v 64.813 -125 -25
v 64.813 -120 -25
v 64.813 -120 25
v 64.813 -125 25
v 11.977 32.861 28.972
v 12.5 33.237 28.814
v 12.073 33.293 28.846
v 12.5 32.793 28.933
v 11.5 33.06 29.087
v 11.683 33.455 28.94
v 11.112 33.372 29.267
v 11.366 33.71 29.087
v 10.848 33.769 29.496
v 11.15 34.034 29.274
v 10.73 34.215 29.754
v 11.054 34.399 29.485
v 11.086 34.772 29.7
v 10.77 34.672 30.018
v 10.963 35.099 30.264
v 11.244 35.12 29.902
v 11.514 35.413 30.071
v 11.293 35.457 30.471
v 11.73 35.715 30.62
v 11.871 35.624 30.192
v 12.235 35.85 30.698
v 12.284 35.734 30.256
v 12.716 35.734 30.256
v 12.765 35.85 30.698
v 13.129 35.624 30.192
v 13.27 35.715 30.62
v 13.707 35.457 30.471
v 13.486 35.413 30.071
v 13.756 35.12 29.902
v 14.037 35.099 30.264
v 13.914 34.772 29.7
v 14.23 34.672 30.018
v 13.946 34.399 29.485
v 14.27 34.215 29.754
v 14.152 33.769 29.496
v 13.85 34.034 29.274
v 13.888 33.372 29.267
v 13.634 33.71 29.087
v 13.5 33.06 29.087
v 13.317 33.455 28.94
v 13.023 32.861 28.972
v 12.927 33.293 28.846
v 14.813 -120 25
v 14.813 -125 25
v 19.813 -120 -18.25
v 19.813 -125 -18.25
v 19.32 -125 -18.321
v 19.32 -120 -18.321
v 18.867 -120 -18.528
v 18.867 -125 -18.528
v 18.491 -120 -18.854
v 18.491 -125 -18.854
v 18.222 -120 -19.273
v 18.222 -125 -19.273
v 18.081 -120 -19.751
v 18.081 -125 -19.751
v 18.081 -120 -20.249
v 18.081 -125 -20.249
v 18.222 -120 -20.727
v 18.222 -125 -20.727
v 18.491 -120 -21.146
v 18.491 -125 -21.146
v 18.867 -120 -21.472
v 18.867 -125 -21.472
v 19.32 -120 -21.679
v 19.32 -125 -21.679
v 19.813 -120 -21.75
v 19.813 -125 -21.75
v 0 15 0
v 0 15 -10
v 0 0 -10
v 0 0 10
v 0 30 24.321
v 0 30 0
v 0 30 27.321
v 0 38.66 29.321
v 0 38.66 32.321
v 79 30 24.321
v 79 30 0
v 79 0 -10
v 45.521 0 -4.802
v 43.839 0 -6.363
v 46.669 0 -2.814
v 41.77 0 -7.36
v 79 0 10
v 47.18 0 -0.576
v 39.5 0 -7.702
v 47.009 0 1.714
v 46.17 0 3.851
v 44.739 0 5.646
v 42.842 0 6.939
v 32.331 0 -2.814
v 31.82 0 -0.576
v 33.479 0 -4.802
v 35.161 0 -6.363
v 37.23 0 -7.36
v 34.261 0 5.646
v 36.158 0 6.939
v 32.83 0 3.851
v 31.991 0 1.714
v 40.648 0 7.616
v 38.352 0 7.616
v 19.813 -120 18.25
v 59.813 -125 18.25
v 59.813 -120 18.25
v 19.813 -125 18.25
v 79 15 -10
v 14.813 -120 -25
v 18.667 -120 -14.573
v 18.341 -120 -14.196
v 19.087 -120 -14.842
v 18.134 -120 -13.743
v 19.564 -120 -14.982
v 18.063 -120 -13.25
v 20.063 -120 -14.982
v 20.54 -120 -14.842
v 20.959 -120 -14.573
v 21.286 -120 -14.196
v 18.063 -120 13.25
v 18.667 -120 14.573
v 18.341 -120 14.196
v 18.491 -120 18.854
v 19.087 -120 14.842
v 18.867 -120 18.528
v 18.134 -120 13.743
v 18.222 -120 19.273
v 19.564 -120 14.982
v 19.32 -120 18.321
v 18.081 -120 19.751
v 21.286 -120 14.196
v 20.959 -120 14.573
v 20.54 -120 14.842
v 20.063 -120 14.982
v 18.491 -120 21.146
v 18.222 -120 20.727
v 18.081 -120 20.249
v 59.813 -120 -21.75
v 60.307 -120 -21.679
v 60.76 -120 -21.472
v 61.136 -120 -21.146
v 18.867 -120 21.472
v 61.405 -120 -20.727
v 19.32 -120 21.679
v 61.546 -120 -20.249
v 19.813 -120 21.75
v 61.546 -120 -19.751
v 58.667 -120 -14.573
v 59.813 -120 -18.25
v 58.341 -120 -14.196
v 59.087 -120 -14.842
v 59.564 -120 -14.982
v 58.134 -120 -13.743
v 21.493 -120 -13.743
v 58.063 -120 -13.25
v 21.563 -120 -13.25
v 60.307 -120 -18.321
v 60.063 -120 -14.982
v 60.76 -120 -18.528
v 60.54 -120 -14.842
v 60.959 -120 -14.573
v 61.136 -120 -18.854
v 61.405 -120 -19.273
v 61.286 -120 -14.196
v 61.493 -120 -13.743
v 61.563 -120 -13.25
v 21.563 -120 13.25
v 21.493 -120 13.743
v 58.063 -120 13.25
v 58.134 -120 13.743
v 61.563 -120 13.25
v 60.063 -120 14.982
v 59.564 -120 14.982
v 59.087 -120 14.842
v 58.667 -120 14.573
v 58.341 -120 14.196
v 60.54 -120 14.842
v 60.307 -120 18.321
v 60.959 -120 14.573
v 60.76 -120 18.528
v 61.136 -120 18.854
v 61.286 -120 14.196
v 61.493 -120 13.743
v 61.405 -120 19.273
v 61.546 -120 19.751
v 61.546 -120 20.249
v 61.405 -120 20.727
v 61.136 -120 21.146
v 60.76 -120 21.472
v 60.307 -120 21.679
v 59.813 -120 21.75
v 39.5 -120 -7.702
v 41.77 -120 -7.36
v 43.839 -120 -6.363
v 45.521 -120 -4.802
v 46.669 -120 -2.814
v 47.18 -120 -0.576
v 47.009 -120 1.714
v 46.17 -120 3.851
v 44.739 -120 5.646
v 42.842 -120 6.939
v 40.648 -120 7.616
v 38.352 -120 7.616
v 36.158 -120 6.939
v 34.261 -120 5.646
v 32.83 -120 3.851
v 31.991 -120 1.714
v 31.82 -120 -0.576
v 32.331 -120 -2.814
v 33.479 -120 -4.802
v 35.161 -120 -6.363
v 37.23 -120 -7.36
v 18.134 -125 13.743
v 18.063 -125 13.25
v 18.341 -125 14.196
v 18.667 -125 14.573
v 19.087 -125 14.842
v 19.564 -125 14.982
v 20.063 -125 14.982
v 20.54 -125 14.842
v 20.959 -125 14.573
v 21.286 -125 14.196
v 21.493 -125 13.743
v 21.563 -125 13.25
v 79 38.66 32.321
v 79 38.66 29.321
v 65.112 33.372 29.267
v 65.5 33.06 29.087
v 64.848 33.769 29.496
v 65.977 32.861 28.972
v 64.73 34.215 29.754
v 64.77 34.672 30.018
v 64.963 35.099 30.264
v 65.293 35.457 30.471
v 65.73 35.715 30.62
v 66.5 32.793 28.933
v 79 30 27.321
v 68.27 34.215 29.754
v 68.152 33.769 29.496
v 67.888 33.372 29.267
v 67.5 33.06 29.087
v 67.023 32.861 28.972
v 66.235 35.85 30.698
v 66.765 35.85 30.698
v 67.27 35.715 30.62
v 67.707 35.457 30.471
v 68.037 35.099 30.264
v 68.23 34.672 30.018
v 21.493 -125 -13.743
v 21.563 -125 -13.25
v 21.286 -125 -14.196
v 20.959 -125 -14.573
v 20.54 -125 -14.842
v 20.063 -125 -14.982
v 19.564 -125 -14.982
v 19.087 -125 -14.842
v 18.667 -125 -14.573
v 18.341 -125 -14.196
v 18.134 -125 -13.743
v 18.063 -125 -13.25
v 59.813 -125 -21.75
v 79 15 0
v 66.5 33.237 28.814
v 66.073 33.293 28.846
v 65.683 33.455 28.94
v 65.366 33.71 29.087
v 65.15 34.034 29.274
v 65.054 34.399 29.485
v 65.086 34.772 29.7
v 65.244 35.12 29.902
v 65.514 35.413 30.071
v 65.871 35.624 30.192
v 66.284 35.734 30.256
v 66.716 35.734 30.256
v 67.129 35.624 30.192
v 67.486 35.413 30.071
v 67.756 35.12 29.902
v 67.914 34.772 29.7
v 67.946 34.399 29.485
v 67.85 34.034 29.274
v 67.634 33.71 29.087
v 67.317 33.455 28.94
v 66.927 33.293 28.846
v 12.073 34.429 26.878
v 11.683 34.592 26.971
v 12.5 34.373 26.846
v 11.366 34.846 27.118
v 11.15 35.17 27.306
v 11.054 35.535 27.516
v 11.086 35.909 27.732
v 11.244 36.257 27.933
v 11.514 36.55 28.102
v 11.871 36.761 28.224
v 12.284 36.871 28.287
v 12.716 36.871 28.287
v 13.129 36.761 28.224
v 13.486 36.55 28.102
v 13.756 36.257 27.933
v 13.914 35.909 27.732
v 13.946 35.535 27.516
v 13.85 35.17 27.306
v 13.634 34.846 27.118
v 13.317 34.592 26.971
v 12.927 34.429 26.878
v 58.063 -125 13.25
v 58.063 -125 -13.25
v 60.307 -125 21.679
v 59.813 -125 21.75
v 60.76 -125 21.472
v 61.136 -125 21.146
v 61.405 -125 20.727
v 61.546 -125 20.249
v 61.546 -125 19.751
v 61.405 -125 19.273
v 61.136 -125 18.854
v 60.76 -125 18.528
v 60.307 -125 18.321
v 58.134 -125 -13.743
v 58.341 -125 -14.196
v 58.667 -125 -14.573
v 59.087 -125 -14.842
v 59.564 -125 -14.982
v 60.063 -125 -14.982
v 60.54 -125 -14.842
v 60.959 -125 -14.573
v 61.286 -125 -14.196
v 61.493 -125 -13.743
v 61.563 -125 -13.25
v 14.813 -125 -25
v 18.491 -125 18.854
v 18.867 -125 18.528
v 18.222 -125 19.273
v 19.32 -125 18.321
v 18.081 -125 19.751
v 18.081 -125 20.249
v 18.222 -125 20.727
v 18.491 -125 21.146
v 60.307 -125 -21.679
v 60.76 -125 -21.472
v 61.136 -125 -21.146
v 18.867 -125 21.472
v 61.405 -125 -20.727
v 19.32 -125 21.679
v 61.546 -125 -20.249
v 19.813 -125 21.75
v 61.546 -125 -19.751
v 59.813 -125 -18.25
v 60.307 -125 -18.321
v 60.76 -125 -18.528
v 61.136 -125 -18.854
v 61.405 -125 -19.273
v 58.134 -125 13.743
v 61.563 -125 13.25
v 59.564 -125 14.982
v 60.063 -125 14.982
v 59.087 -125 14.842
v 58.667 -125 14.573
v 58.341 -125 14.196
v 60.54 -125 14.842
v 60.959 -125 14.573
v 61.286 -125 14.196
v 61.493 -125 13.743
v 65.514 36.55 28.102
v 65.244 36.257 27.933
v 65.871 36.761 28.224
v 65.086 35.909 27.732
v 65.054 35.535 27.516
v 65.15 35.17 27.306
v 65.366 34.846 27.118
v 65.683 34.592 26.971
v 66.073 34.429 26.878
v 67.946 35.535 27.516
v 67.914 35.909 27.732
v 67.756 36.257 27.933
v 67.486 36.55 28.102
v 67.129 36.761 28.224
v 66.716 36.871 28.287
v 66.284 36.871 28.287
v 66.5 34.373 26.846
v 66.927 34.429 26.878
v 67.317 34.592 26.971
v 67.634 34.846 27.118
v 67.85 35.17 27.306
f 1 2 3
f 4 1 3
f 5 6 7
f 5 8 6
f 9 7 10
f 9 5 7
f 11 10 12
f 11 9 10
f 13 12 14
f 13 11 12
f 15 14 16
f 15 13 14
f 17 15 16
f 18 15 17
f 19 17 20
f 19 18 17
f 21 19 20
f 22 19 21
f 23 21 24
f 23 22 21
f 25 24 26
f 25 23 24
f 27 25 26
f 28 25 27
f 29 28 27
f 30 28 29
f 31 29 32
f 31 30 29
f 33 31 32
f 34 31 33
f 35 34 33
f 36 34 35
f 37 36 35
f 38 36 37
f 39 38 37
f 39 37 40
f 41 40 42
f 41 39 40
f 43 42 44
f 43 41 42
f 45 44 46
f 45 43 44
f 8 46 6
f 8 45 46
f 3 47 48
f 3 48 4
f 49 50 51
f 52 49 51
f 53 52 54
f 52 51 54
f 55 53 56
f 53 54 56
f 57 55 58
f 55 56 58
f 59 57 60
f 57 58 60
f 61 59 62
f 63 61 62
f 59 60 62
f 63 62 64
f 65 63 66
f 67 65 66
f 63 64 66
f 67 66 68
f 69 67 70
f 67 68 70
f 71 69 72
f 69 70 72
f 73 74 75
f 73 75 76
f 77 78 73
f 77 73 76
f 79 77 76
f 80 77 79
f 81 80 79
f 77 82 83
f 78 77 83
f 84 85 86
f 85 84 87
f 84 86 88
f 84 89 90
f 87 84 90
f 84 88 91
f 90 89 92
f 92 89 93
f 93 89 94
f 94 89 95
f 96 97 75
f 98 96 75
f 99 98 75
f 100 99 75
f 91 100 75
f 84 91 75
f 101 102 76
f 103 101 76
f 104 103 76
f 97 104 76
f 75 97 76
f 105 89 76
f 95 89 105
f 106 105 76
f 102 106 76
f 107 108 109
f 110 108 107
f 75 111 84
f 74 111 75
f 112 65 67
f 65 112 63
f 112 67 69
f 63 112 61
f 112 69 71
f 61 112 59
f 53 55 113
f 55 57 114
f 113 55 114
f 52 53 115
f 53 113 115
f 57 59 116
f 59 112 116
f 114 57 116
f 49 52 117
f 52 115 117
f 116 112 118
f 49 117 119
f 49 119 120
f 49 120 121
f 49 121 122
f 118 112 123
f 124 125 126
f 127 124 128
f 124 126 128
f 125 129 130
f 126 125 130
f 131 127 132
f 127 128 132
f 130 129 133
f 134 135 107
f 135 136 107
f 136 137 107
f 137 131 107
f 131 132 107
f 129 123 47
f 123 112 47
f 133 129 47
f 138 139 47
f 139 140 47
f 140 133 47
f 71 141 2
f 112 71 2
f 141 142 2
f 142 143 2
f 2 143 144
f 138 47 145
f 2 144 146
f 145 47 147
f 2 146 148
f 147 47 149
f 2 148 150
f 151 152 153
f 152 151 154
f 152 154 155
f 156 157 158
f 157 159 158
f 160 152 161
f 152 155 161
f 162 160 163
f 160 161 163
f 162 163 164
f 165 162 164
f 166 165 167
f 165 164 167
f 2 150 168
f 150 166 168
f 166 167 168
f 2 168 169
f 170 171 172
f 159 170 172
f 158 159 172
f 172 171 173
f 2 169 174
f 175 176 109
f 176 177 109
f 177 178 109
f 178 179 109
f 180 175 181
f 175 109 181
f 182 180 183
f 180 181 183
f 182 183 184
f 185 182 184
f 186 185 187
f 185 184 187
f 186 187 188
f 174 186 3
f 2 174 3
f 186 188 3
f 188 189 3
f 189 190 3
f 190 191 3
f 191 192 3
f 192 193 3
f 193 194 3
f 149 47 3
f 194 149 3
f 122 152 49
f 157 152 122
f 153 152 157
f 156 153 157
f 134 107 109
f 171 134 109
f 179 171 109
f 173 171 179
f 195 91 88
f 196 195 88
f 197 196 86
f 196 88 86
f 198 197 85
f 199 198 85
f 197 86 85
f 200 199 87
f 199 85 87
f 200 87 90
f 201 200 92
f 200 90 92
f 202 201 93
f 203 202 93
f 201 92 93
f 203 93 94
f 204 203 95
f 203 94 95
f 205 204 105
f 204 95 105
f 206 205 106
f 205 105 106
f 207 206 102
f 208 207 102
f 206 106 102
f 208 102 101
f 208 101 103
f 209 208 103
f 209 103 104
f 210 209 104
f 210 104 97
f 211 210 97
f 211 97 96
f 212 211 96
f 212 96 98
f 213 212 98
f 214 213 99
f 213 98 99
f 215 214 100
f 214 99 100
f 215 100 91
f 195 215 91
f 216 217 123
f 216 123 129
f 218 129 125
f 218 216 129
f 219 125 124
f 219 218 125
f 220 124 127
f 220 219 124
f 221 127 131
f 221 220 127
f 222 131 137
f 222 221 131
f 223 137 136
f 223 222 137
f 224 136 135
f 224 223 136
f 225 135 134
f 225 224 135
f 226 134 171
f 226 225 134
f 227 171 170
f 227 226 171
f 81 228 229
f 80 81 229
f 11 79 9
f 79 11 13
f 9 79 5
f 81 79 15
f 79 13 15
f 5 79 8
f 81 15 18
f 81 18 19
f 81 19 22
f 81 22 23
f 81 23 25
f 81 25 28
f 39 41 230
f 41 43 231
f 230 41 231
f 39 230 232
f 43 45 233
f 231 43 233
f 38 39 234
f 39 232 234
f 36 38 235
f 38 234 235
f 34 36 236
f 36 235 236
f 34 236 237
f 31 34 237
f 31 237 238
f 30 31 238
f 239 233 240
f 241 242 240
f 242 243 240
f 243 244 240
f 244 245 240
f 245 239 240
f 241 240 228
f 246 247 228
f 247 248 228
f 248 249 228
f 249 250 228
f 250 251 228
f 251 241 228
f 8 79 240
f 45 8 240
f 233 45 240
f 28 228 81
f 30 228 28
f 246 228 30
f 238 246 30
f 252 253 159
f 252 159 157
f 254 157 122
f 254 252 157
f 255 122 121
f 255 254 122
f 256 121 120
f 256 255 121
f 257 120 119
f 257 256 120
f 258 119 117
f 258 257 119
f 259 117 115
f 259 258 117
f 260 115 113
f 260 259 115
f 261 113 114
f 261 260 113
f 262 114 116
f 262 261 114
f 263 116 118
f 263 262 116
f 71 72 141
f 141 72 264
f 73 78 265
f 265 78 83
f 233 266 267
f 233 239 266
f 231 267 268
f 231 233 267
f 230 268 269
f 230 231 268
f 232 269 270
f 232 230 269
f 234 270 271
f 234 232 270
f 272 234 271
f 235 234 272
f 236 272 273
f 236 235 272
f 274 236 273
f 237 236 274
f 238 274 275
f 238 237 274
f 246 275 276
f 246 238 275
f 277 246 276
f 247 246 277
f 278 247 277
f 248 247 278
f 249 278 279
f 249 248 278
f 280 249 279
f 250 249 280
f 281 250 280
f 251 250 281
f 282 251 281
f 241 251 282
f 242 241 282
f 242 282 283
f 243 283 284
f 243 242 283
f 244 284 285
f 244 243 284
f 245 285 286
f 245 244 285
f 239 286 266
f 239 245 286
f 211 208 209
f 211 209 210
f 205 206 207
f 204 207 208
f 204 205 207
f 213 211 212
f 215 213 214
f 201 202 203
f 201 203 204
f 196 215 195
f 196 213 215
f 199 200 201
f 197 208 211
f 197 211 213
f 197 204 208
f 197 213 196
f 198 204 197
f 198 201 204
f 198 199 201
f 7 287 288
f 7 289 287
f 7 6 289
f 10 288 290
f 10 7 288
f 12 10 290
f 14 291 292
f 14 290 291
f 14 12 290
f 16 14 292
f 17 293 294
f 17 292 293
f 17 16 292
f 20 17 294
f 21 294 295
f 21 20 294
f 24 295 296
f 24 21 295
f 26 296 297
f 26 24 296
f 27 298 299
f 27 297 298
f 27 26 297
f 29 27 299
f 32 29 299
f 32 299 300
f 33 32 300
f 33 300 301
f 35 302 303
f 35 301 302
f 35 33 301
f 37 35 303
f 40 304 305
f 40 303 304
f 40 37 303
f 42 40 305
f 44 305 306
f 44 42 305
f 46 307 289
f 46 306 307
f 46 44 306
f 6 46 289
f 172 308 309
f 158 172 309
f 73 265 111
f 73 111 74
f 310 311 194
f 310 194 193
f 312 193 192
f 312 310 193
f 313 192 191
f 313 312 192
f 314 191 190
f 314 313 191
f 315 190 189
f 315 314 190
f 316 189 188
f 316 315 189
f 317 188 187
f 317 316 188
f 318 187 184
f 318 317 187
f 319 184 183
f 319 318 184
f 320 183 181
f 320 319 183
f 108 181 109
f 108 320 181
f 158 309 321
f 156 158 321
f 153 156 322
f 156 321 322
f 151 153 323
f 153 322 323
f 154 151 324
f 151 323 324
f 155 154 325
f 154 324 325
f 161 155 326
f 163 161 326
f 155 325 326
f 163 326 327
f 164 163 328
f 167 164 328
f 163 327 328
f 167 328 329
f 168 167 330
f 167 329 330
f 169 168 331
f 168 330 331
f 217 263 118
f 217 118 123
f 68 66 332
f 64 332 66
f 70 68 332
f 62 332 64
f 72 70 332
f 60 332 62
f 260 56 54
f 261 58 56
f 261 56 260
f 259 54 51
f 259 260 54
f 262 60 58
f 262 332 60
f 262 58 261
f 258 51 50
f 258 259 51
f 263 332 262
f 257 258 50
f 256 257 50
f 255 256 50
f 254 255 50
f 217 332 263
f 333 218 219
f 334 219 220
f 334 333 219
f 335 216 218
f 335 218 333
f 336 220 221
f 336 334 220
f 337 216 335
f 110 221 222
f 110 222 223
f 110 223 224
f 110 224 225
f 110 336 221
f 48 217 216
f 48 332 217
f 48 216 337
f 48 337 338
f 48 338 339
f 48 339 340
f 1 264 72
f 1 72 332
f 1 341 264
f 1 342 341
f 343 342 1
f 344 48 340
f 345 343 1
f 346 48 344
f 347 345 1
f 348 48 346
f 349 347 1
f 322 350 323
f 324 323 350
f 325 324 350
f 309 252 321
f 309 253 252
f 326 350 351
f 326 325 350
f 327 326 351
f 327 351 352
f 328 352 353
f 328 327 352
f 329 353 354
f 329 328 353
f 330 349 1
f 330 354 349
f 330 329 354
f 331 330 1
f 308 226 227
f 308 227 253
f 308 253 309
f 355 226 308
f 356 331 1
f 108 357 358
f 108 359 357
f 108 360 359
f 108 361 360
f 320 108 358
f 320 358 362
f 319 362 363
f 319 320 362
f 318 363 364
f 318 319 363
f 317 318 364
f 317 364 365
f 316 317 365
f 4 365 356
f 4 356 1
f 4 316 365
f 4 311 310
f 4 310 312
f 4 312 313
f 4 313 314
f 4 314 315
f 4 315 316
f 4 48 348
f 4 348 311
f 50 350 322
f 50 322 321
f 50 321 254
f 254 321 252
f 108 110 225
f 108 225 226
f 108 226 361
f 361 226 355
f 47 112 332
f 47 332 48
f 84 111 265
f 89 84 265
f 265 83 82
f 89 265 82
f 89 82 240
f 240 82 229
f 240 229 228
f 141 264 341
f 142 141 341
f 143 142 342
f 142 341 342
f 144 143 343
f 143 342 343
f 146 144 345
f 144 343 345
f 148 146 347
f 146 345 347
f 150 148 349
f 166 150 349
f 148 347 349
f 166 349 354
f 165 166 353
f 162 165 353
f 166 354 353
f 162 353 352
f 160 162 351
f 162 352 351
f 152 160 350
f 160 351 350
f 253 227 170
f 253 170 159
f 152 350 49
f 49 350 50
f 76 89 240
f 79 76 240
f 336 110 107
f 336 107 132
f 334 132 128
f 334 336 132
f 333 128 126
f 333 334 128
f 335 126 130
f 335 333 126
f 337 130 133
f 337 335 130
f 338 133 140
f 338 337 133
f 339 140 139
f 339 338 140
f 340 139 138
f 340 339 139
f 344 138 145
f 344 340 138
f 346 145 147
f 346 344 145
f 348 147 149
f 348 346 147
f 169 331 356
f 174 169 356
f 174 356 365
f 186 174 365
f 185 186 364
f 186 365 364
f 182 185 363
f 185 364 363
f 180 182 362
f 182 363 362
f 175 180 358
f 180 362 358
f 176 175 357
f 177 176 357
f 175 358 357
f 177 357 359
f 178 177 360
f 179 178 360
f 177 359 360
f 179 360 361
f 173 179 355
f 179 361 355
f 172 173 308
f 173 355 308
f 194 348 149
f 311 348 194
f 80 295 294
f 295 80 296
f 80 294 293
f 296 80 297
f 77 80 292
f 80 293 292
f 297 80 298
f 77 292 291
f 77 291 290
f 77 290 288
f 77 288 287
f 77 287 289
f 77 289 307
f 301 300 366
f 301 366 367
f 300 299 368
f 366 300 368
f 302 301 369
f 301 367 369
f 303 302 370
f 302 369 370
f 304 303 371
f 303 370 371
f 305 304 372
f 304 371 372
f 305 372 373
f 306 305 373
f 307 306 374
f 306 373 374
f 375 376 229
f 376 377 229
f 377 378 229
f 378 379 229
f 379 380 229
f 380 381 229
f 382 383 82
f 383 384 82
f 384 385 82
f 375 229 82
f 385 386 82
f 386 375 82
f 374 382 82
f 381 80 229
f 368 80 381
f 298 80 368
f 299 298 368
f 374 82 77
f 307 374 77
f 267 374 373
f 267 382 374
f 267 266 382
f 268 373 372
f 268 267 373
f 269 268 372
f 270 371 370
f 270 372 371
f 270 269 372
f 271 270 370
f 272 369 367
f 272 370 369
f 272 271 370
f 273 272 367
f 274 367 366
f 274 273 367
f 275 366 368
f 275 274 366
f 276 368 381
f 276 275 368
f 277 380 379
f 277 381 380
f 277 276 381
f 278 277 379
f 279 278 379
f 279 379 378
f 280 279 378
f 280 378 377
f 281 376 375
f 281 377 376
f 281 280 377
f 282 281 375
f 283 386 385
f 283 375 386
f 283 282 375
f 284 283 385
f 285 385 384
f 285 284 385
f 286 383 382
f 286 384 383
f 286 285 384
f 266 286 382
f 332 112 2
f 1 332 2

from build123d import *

# Parameters (mm, degrees)
SKETCH_1_W                    = 79
SKETCH_1_H                    = 30
EXTRUDE_2_DEPTH               = 10
SKETCH_9_W                    = 79
SKETCH_9_H                    = 15
EXTRUDE_3_DEPTH               = 10
SKETCH_10_R                   = 7.701725444
EXTRUDE_4_DEPTH               = 120
SKETCH_11_W                   = 50
SKETCH_11_H                   = 50
EXTRUDE_5_DEPTH               = 5
CUT_EXTRUDE_1_DEPTH           = 10
EXTRUDE_6_DEPTH               = 79
EXTRUDE_7_DEPTH               = 79
HOLE_WIZARD_M3_5_1_AT_2_COUNT = 2
HOLE_WIZARD_M3_5_1_AT_2_PITCH = 54


with BuildPart() as part:
    # 草图1 → 凸台-拉伸2 (new body)
    with BuildSketch(Plane.XY):
        with Locations((39.5, 15)):
            Rectangle(SKETCH_1_W, SKETCH_1_H)
    extrude(amount=EXTRUDE_2_DEPTH)

    # 草图9 → 凸台-拉伸3 (add)
    with BuildSketch(Plane(origin=(0, 0, 0), x_dir=(-1, 0, 0), z_dir=(0, 0, -1))):
        with Locations((-39.5, 7.5)):
            Rectangle(SKETCH_9_W, SKETCH_9_H)
    extrude(amount=EXTRUDE_3_DEPTH)

    # 草图10 → 凸台-拉伸4 (add)
    with BuildSketch(Plane.XZ):
        with Locations(Location((39.5, 0, 0), (0, 0, 270))):
            Circle(SKETCH_10_R)
    extrude(amount=EXTRUDE_4_DEPTH)

    # 草图13 → 凸台-拉伸6 (add)
    with BuildSketch(Plane(origin=(79, 0, 0), x_dir=(0, 0, -1), z_dir=(1, 0, 0))):
        Polygon((-10, 0), (-27.320508076, 30), (-10, 30), align=None)
    extrude(amount=-EXTRUDE_6_DEPTH)

    # 草图16 → 凸台-拉伸7 (add)
    with BuildSketch(Plane(origin=(79, 0, 0), x_dir=(0, 0, -1), z_dir=(1, 0, 0))):
        Polygon((-27.320508076, 30), (-32.320508076, 38.660254038), (-29.320508076, 38.660254038), (-24.320508076, 30), align=None)
    extrude(amount=-EXTRUDE_7_DEPTH)

    # 草图18 → M3.5 螺纹孔1 (revolve, cut)
    with BuildSketch(Plane(origin=(12.5, 34.330127019, 29.820508076), x_dir=(0, -0.8660254037844362, -0.5000000000000046), z_dir=(1, 0, 0))):
        Polygon((0, 0), (0, 36.650635095), (1.45, 36.650635095), (1.45, 0.325), (1.775, 0), align=None)
    hole_wizard_m3_5_1 = revolve(axis=Axis((12.5, 31.155127019, 35.31976939), (0, 0.5000000000000046, -0.866025403784436)), mode=Mode.SUBTRACT)

    # M3.5 螺纹孔1 at 2: M3.5 螺纹孔1 ×2
    with Locations(*[(i * HOLE_WIZARD_M3_5_1_AT_2_PITCH, 0, 0) for i in range(1, HOLE_WIZARD_M3_5_1_AT_2_COUNT)]):
        add(hole_wizard_m3_5_1, mode=Mode.SUBTRACT)


with BuildPart() as body_2:
    # 草图11 → 凸台-拉伸5 (new body)
    with BuildSketch(Plane.XZ.offset(120)):
        with Locations((39.813489276, 0)):
            Rectangle(SKETCH_11_W, SKETCH_11_H)
    extrude(amount=EXTRUDE_5_DEPTH)

    # 草图12 → 切除-拉伸1 (cut)
    with BuildSketch(Plane.XZ.offset(125)):
        with BuildLine():
            Line((19.813489276, 21.75), (59.813489276, 21.75))
            ThreePointArc((59.813489276, 21.75), (61.563489276, 20), (59.813489276, 18.25))
            Line((59.813489276, 18.25), (19.813489276, 18.25))
            ThreePointArc((19.813489276, 18.25), (18.063489276, 20), (19.813489276, 21.75))
        make_face()
        with BuildLine():
            Line((19.813489276, -21.75), (59.813489276, -21.75))
            ThreePointArc((59.813489276, -21.75), (61.563489276, -20), (59.813489276, -18.25))
            Line((59.813489276, -18.25), (19.813489276, -18.25))
            ThreePointArc((19.813489276, -18.25), (18.063489276, -20), (19.813489276, -21.75))
        make_face()
        with BuildLine():
            Line((21.563489276, 13.25), (21.563489276, -13.25))
            ThreePointArc((21.563489276, -13.25), (19.813489276, -15), (18.063489276, -13.25))
            Line((18.063489276, -13.25), (18.063489276, 13.25))
            ThreePointArc((18.063489276, 13.25), (19.813489276, 15), (21.563489276, 13.25))
        make_face()
        with BuildLine():
            Line((58.063489276, 13.25), (58.063489276, -13.25))
            ThreePointArc((58.063489276, -13.25), (59.813489276, -15), (61.563489276, -13.25))
            Line((61.563489276, -13.25), (61.563489276, 13.25))
            ThreePointArc((61.563489276, 13.25), (59.813489276, 15), (58.063489276, 13.25))
        make_face()
    extrude(amount=-CUT_EXTRUDE_1_DEPTH, mode=Mode.SUBTRACT)


solid = Compound([part.part, body_2.part])
